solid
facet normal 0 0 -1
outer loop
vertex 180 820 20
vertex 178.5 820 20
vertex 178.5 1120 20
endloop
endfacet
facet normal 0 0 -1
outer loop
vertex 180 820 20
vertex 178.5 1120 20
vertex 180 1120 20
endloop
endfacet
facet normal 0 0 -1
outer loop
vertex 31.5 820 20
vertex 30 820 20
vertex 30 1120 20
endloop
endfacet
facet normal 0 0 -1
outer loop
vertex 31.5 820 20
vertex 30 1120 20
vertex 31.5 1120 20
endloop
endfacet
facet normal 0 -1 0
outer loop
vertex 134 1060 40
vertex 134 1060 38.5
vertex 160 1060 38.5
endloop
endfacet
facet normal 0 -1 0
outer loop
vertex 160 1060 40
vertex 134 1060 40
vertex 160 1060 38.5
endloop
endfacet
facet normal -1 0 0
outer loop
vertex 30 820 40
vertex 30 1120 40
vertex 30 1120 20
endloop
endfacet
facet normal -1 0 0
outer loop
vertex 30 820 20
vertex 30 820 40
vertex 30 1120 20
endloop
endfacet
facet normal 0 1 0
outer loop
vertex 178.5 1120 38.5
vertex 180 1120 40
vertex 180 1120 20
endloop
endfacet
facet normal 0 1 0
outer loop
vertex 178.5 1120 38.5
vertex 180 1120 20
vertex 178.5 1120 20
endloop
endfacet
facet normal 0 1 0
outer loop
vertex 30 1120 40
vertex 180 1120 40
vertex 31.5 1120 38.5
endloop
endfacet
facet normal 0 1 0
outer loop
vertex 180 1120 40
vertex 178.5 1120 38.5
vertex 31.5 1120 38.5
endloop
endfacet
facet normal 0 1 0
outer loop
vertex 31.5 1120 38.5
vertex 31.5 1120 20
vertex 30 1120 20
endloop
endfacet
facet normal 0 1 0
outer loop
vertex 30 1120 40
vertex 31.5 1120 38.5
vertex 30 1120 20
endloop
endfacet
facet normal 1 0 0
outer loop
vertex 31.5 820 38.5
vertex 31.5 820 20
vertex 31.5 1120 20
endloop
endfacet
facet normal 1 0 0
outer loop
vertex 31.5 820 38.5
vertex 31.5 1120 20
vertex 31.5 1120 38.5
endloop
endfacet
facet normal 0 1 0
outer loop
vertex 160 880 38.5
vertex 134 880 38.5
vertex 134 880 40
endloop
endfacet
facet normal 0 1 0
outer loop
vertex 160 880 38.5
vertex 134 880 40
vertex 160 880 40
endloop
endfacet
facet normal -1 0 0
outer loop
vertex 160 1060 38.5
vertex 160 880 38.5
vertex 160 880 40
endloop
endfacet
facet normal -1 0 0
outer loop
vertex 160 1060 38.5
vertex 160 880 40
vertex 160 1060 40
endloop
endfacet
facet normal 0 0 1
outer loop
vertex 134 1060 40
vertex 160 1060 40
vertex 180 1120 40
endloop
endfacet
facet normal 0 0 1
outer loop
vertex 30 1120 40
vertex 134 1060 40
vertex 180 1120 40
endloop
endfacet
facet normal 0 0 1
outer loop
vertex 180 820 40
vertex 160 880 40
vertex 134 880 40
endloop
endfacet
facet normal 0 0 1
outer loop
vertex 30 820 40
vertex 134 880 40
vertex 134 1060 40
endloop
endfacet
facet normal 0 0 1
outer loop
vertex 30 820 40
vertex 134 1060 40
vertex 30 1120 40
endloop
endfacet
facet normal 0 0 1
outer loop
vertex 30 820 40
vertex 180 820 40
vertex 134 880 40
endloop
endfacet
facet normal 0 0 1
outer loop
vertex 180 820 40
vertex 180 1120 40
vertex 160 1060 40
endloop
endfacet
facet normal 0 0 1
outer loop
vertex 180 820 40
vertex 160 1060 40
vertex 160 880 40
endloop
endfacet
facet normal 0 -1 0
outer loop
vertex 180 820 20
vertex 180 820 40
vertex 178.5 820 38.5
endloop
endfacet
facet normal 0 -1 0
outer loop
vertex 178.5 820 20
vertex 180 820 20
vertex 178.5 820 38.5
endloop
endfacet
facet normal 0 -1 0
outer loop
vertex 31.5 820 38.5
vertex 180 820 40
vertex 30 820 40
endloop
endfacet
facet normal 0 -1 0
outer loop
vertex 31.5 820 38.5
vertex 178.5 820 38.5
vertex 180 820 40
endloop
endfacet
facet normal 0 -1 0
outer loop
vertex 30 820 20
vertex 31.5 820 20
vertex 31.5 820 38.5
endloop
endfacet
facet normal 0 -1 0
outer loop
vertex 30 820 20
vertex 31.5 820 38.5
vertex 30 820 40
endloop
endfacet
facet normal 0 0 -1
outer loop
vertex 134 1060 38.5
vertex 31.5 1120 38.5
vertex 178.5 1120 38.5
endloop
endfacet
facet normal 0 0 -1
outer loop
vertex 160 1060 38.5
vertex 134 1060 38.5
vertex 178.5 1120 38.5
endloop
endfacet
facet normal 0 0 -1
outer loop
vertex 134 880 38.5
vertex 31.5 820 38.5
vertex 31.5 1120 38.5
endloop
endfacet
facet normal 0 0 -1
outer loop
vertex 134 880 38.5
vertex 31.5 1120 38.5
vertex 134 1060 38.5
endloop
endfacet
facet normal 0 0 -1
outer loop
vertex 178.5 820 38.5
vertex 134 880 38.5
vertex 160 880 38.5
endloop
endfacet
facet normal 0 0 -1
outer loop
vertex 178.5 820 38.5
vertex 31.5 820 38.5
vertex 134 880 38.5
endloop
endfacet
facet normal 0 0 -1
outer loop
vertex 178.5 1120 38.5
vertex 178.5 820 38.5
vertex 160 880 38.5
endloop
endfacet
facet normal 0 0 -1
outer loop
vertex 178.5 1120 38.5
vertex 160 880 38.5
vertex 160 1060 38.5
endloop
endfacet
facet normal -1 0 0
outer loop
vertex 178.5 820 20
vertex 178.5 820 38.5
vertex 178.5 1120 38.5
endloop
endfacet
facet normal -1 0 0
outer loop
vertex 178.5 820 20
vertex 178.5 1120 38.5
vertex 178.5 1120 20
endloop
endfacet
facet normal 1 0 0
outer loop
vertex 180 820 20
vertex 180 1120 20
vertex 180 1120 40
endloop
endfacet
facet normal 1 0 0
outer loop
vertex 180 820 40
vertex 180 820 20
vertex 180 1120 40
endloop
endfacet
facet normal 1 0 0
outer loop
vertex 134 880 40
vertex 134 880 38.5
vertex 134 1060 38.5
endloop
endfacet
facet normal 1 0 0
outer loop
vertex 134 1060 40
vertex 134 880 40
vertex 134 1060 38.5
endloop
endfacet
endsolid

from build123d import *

# Parameters (mm, degrees)
OVEN_YAG_KABI_KAPAGI_KAPAK_1_START = 820
OVEN_YAG_KABI_KAPAGI_KAPAK_1_DEPTH = 300
OVEN_YAG_KABI_KAPAGI_KAPAK_2_START = 27
SKETCH2_W                          = 26
SKETCH2_H                          = 180
OVEN_YAG_KABI_KAPAGI_KAPAK_2_DEPTH = 14


with BuildPart() as part:
    # Sketch1 → OVEN_yag_kabi_kapagi_kapak_1 (new body)
    with BuildSketch(Plane(origin=(0, 0, 0), x_dir=(1, 0, 0), z_dir=(0, 1, 0)).offset(OVEN_YAG_KABI_KAPAGI_KAPAK_1_START)):
        Polygon((30, -40), (30, -20), (31.5, -20), (31.5, -38.5), (178.5, -38.5), (178.5, -20), (180, -20), (180, -40), align=None)
    extrude(amount=OVEN_YAG_KABI_KAPAGI_KAPAK_1_DEPTH)

    # Sketch2 → OVEN_yag_kabi_kapagi_kapak_2 (cut)
    with BuildSketch(Plane.XY.offset(OVEN_YAG_KABI_KAPAGI_KAPAK_2_START)):
        with Locations((147, 970)):
            Rectangle(SKETCH2_W, SKETCH2_H)
    extrude(amount=OVEN_YAG_KABI_KAPAGI_KAPAK_2_DEPTH, mode=Mode.SUBTRACT)


solid = part.part
